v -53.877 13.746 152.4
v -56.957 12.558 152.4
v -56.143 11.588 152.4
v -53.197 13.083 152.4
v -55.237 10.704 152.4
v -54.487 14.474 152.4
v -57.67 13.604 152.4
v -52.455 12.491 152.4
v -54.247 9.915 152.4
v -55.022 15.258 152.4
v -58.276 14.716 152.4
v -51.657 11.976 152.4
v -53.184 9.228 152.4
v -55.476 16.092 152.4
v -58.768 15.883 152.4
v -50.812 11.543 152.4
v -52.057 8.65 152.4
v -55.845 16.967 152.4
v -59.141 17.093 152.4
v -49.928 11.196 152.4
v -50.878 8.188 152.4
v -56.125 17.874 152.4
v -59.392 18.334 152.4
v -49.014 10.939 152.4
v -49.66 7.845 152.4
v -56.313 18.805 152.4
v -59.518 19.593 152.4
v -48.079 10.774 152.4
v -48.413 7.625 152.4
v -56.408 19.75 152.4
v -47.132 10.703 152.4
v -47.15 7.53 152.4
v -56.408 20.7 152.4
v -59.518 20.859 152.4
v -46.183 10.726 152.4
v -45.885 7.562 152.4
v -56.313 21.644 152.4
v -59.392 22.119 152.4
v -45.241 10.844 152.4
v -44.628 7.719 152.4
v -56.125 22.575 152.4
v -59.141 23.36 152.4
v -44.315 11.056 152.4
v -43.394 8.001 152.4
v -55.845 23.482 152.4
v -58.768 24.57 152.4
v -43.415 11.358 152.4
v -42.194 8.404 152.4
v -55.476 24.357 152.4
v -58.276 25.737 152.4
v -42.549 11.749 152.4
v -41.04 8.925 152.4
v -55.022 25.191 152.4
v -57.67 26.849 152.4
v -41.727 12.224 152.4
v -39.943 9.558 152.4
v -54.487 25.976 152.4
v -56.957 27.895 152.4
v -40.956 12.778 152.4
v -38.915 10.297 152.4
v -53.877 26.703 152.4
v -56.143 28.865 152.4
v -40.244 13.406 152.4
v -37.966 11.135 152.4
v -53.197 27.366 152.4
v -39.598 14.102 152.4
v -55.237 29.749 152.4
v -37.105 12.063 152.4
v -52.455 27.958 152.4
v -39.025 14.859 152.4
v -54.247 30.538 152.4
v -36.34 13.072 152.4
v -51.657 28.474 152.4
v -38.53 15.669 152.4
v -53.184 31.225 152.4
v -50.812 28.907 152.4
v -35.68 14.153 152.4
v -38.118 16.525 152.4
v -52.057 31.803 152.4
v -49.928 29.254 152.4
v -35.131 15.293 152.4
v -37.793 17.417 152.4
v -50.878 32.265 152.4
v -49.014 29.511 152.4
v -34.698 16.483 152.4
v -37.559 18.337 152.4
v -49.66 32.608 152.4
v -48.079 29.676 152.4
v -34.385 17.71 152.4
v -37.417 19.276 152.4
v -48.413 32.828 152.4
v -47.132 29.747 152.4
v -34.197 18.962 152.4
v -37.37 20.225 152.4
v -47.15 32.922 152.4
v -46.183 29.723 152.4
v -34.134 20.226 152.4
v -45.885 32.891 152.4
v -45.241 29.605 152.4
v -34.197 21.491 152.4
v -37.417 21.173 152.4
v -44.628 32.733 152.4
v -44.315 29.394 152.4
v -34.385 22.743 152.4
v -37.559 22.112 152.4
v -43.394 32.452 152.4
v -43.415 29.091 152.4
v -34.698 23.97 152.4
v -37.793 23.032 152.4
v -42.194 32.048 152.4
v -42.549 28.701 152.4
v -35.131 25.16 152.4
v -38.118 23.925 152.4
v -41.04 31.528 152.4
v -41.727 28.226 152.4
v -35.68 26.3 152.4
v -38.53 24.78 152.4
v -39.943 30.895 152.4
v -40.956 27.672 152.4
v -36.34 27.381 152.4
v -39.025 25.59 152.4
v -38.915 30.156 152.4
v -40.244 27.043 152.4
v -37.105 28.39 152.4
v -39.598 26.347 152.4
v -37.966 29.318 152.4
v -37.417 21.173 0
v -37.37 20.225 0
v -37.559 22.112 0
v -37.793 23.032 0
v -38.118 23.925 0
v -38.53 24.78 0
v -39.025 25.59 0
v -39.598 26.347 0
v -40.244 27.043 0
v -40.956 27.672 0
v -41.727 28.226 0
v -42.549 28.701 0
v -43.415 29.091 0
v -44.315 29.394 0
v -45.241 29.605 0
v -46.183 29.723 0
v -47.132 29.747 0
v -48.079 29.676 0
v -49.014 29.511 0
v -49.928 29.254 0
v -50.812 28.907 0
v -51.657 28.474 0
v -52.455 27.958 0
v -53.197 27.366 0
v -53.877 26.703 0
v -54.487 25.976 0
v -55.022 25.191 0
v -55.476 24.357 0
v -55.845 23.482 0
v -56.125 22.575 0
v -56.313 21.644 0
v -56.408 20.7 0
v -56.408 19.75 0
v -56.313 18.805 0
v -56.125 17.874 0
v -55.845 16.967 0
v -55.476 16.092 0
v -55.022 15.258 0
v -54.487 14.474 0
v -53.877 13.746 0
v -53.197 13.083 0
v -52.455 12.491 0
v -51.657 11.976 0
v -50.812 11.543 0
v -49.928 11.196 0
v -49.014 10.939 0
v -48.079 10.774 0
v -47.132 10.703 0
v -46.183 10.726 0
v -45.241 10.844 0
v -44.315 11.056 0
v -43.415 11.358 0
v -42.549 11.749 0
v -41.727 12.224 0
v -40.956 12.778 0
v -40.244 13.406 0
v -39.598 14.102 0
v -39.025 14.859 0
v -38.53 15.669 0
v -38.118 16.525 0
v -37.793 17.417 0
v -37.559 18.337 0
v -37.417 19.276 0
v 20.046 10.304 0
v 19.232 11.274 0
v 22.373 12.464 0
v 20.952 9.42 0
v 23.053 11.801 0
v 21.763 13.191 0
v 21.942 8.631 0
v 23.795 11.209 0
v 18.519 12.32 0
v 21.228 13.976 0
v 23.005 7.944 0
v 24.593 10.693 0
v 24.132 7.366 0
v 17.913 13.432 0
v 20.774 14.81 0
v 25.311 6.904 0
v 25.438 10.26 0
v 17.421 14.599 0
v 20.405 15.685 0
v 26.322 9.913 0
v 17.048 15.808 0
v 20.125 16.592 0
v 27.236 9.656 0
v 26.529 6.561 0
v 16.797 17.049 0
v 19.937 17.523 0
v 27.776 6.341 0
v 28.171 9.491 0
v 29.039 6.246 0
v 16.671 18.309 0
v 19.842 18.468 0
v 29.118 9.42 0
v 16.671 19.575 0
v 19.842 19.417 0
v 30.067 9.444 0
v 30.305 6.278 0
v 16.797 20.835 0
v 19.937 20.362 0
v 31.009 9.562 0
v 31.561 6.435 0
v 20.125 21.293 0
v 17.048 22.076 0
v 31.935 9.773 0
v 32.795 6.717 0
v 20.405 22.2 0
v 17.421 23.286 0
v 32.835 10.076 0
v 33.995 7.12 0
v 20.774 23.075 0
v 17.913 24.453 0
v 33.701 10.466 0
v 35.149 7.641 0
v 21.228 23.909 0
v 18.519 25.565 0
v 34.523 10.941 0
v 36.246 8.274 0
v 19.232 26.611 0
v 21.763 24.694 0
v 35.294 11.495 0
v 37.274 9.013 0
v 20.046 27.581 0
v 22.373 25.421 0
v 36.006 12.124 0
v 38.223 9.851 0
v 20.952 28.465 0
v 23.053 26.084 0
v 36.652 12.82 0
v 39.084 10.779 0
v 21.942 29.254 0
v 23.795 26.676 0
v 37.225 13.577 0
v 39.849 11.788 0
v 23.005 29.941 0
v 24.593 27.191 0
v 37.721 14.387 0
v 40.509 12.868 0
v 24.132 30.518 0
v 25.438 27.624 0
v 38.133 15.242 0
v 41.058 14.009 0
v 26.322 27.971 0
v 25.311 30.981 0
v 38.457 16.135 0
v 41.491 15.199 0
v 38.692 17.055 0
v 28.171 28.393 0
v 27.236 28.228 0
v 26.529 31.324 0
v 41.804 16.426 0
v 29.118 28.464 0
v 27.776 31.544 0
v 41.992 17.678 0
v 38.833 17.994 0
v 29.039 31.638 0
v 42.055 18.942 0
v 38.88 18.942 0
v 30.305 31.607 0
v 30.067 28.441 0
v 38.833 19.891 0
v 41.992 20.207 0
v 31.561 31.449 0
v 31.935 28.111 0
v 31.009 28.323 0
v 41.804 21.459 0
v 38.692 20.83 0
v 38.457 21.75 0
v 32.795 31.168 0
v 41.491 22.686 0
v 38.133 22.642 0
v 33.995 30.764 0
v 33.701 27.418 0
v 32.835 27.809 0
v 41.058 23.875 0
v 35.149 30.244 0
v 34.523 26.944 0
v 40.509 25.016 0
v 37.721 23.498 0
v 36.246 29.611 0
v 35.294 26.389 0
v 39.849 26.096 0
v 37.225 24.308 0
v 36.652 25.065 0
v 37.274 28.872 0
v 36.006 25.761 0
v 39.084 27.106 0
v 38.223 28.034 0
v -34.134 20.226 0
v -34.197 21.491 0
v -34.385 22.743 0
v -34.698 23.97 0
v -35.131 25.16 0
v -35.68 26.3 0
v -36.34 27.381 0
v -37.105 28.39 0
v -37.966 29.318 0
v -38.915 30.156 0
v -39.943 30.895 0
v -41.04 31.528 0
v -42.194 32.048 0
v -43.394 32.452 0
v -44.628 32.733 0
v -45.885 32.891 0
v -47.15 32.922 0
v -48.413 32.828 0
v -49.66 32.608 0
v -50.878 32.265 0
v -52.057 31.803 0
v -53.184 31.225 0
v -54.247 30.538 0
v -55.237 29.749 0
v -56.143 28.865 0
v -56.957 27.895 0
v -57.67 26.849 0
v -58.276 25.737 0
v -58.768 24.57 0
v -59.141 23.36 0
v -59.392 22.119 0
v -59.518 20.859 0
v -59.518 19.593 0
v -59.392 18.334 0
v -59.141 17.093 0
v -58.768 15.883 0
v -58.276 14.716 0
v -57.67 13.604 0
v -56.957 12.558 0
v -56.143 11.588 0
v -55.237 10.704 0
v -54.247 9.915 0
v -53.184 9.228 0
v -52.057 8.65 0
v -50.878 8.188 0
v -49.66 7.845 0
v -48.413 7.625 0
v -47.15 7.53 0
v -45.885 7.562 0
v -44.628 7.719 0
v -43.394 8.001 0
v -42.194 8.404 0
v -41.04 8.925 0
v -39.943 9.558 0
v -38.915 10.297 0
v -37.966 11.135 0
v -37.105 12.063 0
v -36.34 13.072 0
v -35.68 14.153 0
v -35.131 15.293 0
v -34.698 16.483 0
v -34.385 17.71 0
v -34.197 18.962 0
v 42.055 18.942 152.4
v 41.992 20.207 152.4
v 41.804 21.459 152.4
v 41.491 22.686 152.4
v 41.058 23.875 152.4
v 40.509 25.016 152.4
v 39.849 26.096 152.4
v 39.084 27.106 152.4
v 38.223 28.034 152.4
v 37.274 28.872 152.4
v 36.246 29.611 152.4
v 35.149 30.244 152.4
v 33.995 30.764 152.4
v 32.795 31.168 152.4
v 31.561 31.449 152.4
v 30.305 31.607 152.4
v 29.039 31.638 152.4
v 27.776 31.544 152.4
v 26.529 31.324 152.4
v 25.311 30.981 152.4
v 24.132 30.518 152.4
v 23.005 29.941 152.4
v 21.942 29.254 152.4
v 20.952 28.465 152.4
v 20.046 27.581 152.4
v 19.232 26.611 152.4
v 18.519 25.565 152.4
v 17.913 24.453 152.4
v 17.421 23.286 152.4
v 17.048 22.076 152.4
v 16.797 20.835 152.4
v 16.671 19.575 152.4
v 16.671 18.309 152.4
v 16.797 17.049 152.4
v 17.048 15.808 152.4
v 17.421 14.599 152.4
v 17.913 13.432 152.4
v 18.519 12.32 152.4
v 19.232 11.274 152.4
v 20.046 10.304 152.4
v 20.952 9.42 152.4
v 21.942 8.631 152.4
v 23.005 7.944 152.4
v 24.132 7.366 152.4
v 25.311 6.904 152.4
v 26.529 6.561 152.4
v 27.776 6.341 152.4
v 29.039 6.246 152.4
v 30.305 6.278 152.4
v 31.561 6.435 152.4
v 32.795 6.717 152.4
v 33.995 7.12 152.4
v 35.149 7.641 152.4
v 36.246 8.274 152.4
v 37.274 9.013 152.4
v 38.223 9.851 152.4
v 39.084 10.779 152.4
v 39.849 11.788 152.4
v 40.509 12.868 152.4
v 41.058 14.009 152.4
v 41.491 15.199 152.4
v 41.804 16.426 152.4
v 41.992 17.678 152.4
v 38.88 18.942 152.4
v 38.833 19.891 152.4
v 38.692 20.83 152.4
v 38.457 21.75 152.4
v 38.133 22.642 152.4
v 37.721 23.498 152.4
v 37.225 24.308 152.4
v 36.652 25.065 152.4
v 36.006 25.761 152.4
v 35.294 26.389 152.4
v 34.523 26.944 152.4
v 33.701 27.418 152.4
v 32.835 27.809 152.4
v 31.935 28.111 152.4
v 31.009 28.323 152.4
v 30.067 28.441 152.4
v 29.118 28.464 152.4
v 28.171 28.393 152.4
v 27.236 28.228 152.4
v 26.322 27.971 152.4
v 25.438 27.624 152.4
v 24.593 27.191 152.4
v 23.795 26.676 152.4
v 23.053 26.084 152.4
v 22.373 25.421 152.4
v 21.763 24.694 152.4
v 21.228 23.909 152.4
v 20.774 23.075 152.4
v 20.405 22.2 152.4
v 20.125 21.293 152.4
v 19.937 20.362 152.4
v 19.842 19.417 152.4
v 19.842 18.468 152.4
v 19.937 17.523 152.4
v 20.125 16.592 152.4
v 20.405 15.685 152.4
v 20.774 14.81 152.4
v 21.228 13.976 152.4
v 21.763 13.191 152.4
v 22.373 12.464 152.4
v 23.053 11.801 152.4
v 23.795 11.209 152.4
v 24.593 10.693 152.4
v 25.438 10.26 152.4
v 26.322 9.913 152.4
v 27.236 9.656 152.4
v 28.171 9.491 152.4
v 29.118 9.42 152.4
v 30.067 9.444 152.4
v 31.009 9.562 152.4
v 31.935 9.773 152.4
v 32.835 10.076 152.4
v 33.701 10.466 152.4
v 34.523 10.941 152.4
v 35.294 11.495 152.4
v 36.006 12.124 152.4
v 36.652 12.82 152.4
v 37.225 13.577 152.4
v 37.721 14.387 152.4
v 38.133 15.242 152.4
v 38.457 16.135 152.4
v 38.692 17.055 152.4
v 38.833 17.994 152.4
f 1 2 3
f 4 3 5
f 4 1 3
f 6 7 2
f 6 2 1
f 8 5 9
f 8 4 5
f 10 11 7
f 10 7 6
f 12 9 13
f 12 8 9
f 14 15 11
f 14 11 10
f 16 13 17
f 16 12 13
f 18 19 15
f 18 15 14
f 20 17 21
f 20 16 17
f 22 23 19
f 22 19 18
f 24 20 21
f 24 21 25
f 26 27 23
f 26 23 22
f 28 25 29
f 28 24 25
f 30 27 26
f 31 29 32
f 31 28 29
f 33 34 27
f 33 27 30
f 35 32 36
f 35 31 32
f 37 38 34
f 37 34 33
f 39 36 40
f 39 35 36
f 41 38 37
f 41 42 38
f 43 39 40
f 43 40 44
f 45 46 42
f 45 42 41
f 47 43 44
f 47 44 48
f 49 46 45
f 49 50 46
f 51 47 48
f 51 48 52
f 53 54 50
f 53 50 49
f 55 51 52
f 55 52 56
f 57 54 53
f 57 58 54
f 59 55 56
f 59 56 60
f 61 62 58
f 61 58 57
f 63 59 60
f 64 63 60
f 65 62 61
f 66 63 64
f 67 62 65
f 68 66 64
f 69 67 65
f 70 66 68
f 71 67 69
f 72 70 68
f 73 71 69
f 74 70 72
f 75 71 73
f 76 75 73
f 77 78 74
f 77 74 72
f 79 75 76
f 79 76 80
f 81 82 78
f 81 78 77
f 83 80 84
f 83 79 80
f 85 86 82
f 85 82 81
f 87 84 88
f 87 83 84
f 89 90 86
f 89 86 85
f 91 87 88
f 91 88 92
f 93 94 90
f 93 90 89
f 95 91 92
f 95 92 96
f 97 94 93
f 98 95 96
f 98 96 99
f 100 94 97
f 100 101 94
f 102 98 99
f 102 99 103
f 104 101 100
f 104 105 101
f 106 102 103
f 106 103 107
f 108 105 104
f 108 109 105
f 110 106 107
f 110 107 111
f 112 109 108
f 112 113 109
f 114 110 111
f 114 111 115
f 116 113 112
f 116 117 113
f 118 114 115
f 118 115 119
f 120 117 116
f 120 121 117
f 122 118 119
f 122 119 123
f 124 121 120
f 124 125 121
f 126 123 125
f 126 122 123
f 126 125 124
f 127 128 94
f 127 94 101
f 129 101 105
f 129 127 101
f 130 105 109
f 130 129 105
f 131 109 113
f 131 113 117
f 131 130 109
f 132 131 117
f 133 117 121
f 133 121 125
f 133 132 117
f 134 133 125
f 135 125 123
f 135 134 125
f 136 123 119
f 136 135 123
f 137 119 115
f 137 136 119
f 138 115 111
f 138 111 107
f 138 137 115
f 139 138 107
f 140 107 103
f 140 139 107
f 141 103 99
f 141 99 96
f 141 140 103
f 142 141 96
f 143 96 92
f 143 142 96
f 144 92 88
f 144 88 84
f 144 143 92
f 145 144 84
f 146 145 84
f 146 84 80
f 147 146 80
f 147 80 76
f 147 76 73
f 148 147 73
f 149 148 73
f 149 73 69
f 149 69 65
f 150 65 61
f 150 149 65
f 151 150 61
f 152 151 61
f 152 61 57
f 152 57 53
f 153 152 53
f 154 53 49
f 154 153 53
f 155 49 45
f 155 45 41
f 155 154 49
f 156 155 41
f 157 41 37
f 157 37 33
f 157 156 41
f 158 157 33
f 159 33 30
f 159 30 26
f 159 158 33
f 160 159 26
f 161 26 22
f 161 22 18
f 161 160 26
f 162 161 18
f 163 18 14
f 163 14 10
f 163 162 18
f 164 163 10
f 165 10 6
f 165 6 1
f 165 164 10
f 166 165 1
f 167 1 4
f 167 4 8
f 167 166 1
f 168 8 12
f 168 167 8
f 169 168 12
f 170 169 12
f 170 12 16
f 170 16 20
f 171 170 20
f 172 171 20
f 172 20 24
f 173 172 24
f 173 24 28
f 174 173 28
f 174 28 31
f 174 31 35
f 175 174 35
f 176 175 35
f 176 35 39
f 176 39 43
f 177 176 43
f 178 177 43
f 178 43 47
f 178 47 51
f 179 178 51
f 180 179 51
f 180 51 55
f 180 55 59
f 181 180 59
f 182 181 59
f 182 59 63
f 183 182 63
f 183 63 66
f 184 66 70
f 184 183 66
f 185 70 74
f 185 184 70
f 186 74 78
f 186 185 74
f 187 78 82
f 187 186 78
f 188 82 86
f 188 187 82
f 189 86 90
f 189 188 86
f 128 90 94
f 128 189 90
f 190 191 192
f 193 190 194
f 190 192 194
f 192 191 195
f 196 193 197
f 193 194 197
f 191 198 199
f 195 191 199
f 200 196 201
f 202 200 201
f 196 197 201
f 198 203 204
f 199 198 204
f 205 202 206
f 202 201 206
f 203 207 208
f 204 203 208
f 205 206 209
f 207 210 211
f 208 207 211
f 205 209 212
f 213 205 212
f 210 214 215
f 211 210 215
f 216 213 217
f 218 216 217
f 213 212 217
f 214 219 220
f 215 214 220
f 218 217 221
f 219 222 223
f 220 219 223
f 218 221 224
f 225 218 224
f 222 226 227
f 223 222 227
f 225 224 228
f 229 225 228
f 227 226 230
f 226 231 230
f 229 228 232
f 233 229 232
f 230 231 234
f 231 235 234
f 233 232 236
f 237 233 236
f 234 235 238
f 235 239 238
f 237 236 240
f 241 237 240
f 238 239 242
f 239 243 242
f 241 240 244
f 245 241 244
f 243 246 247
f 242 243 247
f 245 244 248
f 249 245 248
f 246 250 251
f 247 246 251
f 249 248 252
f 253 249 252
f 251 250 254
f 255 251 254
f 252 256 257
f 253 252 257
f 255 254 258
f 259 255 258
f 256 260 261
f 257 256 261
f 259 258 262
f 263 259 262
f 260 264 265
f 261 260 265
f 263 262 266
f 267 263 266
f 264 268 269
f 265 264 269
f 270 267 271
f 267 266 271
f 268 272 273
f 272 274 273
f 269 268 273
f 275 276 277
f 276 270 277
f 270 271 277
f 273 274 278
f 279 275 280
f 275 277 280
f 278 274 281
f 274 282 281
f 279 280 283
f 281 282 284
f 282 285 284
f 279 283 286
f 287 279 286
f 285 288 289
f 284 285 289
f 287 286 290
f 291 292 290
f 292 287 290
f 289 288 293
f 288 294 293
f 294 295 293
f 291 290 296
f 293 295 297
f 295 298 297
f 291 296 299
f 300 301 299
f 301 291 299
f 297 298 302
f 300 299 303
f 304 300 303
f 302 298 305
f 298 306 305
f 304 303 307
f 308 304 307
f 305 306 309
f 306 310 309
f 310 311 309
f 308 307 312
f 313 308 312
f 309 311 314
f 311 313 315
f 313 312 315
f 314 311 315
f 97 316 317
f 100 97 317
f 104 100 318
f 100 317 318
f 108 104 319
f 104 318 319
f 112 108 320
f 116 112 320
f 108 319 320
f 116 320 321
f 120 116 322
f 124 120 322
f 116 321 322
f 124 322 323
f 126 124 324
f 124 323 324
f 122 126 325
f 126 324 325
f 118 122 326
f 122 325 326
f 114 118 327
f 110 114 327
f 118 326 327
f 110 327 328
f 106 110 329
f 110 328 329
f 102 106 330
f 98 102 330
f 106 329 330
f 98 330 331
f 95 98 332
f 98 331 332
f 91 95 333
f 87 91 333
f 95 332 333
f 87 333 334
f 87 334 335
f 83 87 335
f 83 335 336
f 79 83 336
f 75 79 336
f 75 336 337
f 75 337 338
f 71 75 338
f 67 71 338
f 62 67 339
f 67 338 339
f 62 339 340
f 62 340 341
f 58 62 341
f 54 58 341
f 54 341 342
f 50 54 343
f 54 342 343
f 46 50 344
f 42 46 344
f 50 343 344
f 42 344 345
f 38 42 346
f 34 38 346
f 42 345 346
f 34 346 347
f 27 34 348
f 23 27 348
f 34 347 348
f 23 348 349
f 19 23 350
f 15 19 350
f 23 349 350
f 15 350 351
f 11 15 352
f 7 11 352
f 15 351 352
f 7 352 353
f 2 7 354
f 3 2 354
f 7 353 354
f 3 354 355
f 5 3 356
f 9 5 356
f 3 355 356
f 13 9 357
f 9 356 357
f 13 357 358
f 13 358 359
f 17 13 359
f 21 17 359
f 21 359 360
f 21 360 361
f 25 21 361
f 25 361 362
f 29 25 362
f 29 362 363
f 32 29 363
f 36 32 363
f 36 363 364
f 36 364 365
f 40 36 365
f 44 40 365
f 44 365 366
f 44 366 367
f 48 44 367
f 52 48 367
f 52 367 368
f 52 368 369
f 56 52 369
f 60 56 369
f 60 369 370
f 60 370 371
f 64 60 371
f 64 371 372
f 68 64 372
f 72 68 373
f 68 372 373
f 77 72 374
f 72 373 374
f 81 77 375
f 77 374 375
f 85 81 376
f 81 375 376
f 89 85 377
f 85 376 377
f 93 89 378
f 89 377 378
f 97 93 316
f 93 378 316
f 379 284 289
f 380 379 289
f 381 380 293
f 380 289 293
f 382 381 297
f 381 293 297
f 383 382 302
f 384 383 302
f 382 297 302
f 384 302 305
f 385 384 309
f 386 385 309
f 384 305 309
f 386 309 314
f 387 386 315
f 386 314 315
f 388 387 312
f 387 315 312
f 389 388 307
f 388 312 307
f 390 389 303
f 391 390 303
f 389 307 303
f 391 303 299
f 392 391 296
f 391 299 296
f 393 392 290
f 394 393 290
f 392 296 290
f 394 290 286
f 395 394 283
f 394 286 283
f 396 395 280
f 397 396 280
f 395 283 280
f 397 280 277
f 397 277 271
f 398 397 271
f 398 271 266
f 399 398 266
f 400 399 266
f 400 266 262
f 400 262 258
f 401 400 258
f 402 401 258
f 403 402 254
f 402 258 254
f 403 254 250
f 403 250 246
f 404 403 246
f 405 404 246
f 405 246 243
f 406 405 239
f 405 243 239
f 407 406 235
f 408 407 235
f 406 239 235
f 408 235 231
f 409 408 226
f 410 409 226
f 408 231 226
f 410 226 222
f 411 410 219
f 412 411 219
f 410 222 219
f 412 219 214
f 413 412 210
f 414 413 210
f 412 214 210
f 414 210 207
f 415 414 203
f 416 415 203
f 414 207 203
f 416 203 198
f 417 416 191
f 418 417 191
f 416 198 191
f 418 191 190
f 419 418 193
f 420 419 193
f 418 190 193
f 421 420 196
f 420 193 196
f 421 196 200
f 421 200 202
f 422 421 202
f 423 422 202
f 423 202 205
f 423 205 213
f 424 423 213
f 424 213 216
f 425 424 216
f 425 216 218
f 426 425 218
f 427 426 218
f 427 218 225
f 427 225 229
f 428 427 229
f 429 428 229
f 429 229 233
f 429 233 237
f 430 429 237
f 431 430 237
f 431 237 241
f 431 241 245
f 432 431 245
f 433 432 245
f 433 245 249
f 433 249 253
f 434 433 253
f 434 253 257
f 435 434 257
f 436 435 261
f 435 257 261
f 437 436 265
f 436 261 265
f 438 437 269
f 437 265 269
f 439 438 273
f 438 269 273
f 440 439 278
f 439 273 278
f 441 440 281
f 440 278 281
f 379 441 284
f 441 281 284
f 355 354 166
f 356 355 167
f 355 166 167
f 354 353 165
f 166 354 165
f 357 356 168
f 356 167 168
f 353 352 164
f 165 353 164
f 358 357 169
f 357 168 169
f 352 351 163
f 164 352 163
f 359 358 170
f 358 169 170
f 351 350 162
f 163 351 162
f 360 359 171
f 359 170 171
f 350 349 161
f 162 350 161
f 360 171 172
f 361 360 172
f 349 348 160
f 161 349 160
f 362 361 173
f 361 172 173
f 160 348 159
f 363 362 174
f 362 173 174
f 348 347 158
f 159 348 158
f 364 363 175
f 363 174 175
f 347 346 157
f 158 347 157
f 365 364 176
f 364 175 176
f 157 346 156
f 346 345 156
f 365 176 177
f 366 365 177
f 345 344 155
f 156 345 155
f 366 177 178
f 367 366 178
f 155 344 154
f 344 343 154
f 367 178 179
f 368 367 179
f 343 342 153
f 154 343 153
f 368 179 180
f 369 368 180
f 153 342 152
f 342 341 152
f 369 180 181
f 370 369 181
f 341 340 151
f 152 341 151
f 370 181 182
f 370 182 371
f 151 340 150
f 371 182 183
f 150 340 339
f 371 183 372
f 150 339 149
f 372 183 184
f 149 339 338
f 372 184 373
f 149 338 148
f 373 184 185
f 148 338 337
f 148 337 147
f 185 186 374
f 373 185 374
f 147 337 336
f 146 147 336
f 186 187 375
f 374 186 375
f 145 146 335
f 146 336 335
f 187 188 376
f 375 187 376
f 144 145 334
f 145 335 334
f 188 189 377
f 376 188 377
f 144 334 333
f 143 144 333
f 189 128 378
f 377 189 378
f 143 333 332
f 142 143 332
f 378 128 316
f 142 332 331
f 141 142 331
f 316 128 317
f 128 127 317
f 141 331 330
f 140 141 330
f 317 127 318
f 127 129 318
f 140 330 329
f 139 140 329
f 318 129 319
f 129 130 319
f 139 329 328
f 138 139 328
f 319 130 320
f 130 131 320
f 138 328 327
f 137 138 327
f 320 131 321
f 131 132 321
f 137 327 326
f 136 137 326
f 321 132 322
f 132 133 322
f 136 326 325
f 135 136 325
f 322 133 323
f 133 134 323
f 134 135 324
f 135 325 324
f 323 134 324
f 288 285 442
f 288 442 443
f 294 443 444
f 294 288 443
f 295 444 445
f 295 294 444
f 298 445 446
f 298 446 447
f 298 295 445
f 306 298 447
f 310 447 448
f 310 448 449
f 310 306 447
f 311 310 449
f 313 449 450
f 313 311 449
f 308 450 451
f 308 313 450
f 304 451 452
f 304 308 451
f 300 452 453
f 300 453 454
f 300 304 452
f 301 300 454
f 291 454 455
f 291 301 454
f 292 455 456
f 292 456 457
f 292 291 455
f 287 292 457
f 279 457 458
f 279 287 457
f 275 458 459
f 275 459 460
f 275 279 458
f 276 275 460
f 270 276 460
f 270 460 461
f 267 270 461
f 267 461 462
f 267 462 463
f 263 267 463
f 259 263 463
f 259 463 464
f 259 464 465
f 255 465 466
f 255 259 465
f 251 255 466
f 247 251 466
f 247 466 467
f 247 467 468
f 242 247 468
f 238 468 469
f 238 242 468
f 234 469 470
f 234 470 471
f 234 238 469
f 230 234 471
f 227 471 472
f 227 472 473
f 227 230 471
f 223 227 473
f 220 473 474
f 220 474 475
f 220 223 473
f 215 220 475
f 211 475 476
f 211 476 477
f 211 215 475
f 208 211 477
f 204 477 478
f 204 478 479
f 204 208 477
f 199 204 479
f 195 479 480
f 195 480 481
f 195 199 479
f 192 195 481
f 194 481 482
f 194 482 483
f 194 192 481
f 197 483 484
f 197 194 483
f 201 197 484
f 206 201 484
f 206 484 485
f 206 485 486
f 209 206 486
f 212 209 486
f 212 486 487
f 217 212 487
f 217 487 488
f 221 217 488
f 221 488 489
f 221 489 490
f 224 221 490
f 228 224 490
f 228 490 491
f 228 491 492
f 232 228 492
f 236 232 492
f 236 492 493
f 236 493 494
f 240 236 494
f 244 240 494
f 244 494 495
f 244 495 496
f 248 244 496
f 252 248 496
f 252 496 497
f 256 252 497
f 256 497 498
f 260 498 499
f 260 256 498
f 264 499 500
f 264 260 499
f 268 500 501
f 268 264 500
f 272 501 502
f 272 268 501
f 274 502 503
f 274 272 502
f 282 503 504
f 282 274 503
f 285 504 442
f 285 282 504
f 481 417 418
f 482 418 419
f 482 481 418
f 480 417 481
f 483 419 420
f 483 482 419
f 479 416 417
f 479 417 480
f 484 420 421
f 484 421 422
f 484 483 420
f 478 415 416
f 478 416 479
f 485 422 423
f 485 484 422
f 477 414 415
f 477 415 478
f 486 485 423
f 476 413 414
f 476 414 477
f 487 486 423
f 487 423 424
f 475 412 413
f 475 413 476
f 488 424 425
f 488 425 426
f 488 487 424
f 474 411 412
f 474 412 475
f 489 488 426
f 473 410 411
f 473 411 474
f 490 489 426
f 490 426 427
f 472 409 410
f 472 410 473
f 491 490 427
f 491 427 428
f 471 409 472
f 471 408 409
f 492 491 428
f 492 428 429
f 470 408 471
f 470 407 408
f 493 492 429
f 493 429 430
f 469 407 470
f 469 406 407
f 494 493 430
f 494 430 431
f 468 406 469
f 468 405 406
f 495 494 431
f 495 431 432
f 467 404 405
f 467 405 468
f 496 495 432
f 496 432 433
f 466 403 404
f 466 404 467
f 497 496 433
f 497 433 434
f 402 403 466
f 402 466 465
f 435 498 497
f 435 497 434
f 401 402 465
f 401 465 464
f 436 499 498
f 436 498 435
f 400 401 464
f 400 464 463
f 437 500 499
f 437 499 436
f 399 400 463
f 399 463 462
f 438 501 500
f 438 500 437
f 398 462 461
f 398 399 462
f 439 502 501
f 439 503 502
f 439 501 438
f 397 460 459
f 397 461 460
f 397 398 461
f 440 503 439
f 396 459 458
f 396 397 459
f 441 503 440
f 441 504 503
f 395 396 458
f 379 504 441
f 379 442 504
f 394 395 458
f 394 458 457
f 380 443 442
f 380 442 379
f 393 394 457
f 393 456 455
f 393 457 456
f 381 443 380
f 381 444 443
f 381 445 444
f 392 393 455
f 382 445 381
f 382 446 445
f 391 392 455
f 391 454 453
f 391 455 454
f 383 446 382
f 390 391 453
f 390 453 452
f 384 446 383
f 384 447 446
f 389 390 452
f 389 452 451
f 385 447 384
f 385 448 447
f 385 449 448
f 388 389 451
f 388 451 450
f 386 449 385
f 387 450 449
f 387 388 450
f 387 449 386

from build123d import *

# Parameters (mm, degrees)
F0_R     = 12.7
F0_R_2   = 9.525
F1_DEPTH = 152.4


with BuildPart() as f1:
    # F0 (on Top) → F1 (new body)
    with BuildSketch(Plane.XY):
        with Locations((-46.833682, 20.226395)):
            Circle(F0_R)
        with Locations((-46.894751, 20.22475)):
            Circle(F0_R_2, mode=Mode.SUBTRACT)
        with Locations((29.355498, 18.942307)):
            Circle(F0_R)
        with Locations((29.355498, 18.942307)):
            Circle(F0_R_2, mode=Mode.SUBTRACT)
    extrude(amount=F1_DEPTH)


solid = f1.part
